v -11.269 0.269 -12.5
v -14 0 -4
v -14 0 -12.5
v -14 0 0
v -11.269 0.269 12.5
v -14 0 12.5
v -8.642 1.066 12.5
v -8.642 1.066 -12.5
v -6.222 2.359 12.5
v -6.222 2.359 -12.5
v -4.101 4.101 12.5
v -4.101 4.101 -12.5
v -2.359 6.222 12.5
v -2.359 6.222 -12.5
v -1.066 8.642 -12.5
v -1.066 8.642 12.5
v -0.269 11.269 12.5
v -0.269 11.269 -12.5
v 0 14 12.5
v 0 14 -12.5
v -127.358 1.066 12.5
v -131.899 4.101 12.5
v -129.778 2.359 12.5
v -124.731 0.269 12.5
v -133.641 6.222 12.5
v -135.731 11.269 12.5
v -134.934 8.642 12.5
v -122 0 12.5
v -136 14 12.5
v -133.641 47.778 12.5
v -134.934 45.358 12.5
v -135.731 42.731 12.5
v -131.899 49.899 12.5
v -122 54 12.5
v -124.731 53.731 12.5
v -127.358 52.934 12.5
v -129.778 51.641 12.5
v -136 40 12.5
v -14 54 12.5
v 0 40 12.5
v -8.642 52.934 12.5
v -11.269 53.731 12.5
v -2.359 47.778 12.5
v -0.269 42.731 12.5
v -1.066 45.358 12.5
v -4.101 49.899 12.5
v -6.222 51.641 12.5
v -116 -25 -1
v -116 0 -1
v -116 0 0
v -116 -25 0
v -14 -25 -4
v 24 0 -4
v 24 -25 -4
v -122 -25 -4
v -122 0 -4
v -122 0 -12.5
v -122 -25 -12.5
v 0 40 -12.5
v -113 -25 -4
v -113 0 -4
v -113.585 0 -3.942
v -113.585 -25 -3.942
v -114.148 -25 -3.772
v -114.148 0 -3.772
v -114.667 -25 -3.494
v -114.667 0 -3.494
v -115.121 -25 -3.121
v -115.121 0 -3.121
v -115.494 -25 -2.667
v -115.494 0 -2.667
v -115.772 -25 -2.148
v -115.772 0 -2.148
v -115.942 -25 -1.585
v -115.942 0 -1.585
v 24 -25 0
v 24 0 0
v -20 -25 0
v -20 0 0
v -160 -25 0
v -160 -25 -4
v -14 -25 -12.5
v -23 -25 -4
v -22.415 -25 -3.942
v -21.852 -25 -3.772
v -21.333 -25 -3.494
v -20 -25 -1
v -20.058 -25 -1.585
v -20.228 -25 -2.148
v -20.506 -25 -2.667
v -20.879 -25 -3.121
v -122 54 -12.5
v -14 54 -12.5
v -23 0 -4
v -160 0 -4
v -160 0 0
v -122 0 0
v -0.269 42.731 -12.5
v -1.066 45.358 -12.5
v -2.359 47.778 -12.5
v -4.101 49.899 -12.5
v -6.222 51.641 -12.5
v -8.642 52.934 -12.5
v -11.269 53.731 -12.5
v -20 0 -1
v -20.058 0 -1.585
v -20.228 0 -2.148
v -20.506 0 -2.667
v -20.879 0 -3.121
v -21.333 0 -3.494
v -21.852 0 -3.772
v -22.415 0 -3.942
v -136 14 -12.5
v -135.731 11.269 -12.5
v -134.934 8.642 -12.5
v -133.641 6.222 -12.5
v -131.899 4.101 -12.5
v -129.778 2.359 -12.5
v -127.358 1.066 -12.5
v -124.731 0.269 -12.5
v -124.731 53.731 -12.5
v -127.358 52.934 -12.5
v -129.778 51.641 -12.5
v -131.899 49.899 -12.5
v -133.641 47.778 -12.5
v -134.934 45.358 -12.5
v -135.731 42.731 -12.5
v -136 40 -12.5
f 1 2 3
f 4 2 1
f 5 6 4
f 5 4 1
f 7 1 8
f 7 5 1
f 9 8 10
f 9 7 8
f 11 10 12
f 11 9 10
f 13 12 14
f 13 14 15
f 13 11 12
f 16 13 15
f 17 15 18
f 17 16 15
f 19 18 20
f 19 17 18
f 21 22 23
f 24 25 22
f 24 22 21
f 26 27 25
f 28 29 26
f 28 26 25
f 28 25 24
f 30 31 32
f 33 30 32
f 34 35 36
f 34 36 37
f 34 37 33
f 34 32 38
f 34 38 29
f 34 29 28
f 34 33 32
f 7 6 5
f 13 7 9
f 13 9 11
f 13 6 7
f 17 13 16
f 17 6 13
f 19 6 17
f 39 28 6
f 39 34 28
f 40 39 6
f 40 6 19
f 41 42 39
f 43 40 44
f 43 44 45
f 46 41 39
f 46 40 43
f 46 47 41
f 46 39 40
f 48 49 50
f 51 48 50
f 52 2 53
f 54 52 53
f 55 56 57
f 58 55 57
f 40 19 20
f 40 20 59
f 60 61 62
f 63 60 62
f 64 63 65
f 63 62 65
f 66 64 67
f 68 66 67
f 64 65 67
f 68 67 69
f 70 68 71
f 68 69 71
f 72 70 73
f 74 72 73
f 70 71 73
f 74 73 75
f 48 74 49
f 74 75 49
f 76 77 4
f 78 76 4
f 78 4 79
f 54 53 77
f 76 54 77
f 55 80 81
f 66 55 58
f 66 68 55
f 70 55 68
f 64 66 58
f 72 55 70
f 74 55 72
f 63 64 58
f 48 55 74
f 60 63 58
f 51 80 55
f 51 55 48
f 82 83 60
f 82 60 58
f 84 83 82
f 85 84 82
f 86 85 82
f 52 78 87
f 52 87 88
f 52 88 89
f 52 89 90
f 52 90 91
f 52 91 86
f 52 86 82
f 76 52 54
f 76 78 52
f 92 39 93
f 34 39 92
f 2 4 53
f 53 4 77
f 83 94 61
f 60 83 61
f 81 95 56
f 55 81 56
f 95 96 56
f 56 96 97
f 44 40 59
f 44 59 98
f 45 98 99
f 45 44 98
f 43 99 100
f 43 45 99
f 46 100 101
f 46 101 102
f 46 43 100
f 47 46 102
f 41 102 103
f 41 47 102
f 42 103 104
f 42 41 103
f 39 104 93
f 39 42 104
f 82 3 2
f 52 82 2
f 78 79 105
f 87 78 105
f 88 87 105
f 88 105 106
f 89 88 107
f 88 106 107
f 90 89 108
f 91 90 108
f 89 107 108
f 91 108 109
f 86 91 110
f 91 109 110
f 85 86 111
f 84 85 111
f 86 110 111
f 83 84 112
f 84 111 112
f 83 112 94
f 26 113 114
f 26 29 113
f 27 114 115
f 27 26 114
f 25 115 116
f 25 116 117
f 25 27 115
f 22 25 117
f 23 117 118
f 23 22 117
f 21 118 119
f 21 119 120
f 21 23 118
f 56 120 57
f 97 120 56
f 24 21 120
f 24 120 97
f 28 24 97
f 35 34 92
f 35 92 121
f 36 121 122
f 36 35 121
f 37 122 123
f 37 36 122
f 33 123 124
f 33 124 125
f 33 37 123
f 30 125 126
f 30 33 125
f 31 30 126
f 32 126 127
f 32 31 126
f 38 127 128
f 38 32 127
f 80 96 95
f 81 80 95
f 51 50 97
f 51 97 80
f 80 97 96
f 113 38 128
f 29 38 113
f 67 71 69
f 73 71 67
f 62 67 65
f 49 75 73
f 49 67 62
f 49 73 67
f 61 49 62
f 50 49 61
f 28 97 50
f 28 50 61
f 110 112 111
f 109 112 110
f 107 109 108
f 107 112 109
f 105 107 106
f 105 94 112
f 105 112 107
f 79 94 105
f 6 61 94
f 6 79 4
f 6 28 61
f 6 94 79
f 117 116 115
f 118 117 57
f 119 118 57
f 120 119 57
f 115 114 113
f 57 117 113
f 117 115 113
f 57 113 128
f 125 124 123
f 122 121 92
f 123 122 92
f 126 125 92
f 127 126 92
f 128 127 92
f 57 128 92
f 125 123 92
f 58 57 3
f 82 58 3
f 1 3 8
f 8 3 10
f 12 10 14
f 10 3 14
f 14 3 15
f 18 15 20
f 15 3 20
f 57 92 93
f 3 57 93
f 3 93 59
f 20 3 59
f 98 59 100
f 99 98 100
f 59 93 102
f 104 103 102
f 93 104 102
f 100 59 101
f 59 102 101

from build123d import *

# Parameters (mm, degrees)
F1_DEPTH = 12.5
F5_DEPTH = 25


# Not quite as in the source:
# - the program builds the solid bodies; features that only make, move or delete a surface that nothing else refers to are left out


with BuildPart() as f1:
    # F0 (on Top) → F1 (new body, symmetric)
    with BuildSketch(Plane.XY):
        with BuildLine():
            Line((-122, 0), (-14, 0))
            ThreePointArc((-14, 0), (-4.1005050634, 4.1005050634), (0, 14))
            Line((0, 14), (0, 40))
            ThreePointArc((0, 40), (-4.1005050634, 49.8994949366), (-14, 54))
            Line((-14, 54), (-122, 54))
            ThreePointArc((-122, 54), (-131.8994949366, 49.8994949366), (-136, 40))
            Line((-136, 40), (-136, 14))
            ThreePointArc((-136, 14), (-131.8994949366, 4.1005050634), (-122, 0))
        make_face()
    extrude(amount=F1_DEPTH, both=True)

    # F4 (on face) → F5 (join)
    with BuildSketch(Plane.XZ):
        with BuildLine():
            Line((-122, -4), (-122, -12.5))
            Line((-122, -12.5), (-14, -12.5))
            Line((-14, -12.5), (-14, -4))
            Line((-14, -4), (24, -4))
            Line((24, -4), (24, 0))
            Line((24, 0), (-20, 0))
            Line((-20, 0), (-20, -1))
            ThreePointArc((-20, -1), (-20.8786796564, -3.1213203436), (-23, -4))
            Line((-23, -4), (-113, -4))
            ThreePointArc((-113, -4), (-115.1213203436, -3.1213203436), (-116, -1))
            Line((-116, -1), (-116, 0))
            Line((-116, 0), (-160, 0))
            Line((-160, 0), (-160, -4))
            Line((-160, -4), (-122, -4))
        make_face()
    extrude(amount=F5_DEPTH)


solid = f1.part
